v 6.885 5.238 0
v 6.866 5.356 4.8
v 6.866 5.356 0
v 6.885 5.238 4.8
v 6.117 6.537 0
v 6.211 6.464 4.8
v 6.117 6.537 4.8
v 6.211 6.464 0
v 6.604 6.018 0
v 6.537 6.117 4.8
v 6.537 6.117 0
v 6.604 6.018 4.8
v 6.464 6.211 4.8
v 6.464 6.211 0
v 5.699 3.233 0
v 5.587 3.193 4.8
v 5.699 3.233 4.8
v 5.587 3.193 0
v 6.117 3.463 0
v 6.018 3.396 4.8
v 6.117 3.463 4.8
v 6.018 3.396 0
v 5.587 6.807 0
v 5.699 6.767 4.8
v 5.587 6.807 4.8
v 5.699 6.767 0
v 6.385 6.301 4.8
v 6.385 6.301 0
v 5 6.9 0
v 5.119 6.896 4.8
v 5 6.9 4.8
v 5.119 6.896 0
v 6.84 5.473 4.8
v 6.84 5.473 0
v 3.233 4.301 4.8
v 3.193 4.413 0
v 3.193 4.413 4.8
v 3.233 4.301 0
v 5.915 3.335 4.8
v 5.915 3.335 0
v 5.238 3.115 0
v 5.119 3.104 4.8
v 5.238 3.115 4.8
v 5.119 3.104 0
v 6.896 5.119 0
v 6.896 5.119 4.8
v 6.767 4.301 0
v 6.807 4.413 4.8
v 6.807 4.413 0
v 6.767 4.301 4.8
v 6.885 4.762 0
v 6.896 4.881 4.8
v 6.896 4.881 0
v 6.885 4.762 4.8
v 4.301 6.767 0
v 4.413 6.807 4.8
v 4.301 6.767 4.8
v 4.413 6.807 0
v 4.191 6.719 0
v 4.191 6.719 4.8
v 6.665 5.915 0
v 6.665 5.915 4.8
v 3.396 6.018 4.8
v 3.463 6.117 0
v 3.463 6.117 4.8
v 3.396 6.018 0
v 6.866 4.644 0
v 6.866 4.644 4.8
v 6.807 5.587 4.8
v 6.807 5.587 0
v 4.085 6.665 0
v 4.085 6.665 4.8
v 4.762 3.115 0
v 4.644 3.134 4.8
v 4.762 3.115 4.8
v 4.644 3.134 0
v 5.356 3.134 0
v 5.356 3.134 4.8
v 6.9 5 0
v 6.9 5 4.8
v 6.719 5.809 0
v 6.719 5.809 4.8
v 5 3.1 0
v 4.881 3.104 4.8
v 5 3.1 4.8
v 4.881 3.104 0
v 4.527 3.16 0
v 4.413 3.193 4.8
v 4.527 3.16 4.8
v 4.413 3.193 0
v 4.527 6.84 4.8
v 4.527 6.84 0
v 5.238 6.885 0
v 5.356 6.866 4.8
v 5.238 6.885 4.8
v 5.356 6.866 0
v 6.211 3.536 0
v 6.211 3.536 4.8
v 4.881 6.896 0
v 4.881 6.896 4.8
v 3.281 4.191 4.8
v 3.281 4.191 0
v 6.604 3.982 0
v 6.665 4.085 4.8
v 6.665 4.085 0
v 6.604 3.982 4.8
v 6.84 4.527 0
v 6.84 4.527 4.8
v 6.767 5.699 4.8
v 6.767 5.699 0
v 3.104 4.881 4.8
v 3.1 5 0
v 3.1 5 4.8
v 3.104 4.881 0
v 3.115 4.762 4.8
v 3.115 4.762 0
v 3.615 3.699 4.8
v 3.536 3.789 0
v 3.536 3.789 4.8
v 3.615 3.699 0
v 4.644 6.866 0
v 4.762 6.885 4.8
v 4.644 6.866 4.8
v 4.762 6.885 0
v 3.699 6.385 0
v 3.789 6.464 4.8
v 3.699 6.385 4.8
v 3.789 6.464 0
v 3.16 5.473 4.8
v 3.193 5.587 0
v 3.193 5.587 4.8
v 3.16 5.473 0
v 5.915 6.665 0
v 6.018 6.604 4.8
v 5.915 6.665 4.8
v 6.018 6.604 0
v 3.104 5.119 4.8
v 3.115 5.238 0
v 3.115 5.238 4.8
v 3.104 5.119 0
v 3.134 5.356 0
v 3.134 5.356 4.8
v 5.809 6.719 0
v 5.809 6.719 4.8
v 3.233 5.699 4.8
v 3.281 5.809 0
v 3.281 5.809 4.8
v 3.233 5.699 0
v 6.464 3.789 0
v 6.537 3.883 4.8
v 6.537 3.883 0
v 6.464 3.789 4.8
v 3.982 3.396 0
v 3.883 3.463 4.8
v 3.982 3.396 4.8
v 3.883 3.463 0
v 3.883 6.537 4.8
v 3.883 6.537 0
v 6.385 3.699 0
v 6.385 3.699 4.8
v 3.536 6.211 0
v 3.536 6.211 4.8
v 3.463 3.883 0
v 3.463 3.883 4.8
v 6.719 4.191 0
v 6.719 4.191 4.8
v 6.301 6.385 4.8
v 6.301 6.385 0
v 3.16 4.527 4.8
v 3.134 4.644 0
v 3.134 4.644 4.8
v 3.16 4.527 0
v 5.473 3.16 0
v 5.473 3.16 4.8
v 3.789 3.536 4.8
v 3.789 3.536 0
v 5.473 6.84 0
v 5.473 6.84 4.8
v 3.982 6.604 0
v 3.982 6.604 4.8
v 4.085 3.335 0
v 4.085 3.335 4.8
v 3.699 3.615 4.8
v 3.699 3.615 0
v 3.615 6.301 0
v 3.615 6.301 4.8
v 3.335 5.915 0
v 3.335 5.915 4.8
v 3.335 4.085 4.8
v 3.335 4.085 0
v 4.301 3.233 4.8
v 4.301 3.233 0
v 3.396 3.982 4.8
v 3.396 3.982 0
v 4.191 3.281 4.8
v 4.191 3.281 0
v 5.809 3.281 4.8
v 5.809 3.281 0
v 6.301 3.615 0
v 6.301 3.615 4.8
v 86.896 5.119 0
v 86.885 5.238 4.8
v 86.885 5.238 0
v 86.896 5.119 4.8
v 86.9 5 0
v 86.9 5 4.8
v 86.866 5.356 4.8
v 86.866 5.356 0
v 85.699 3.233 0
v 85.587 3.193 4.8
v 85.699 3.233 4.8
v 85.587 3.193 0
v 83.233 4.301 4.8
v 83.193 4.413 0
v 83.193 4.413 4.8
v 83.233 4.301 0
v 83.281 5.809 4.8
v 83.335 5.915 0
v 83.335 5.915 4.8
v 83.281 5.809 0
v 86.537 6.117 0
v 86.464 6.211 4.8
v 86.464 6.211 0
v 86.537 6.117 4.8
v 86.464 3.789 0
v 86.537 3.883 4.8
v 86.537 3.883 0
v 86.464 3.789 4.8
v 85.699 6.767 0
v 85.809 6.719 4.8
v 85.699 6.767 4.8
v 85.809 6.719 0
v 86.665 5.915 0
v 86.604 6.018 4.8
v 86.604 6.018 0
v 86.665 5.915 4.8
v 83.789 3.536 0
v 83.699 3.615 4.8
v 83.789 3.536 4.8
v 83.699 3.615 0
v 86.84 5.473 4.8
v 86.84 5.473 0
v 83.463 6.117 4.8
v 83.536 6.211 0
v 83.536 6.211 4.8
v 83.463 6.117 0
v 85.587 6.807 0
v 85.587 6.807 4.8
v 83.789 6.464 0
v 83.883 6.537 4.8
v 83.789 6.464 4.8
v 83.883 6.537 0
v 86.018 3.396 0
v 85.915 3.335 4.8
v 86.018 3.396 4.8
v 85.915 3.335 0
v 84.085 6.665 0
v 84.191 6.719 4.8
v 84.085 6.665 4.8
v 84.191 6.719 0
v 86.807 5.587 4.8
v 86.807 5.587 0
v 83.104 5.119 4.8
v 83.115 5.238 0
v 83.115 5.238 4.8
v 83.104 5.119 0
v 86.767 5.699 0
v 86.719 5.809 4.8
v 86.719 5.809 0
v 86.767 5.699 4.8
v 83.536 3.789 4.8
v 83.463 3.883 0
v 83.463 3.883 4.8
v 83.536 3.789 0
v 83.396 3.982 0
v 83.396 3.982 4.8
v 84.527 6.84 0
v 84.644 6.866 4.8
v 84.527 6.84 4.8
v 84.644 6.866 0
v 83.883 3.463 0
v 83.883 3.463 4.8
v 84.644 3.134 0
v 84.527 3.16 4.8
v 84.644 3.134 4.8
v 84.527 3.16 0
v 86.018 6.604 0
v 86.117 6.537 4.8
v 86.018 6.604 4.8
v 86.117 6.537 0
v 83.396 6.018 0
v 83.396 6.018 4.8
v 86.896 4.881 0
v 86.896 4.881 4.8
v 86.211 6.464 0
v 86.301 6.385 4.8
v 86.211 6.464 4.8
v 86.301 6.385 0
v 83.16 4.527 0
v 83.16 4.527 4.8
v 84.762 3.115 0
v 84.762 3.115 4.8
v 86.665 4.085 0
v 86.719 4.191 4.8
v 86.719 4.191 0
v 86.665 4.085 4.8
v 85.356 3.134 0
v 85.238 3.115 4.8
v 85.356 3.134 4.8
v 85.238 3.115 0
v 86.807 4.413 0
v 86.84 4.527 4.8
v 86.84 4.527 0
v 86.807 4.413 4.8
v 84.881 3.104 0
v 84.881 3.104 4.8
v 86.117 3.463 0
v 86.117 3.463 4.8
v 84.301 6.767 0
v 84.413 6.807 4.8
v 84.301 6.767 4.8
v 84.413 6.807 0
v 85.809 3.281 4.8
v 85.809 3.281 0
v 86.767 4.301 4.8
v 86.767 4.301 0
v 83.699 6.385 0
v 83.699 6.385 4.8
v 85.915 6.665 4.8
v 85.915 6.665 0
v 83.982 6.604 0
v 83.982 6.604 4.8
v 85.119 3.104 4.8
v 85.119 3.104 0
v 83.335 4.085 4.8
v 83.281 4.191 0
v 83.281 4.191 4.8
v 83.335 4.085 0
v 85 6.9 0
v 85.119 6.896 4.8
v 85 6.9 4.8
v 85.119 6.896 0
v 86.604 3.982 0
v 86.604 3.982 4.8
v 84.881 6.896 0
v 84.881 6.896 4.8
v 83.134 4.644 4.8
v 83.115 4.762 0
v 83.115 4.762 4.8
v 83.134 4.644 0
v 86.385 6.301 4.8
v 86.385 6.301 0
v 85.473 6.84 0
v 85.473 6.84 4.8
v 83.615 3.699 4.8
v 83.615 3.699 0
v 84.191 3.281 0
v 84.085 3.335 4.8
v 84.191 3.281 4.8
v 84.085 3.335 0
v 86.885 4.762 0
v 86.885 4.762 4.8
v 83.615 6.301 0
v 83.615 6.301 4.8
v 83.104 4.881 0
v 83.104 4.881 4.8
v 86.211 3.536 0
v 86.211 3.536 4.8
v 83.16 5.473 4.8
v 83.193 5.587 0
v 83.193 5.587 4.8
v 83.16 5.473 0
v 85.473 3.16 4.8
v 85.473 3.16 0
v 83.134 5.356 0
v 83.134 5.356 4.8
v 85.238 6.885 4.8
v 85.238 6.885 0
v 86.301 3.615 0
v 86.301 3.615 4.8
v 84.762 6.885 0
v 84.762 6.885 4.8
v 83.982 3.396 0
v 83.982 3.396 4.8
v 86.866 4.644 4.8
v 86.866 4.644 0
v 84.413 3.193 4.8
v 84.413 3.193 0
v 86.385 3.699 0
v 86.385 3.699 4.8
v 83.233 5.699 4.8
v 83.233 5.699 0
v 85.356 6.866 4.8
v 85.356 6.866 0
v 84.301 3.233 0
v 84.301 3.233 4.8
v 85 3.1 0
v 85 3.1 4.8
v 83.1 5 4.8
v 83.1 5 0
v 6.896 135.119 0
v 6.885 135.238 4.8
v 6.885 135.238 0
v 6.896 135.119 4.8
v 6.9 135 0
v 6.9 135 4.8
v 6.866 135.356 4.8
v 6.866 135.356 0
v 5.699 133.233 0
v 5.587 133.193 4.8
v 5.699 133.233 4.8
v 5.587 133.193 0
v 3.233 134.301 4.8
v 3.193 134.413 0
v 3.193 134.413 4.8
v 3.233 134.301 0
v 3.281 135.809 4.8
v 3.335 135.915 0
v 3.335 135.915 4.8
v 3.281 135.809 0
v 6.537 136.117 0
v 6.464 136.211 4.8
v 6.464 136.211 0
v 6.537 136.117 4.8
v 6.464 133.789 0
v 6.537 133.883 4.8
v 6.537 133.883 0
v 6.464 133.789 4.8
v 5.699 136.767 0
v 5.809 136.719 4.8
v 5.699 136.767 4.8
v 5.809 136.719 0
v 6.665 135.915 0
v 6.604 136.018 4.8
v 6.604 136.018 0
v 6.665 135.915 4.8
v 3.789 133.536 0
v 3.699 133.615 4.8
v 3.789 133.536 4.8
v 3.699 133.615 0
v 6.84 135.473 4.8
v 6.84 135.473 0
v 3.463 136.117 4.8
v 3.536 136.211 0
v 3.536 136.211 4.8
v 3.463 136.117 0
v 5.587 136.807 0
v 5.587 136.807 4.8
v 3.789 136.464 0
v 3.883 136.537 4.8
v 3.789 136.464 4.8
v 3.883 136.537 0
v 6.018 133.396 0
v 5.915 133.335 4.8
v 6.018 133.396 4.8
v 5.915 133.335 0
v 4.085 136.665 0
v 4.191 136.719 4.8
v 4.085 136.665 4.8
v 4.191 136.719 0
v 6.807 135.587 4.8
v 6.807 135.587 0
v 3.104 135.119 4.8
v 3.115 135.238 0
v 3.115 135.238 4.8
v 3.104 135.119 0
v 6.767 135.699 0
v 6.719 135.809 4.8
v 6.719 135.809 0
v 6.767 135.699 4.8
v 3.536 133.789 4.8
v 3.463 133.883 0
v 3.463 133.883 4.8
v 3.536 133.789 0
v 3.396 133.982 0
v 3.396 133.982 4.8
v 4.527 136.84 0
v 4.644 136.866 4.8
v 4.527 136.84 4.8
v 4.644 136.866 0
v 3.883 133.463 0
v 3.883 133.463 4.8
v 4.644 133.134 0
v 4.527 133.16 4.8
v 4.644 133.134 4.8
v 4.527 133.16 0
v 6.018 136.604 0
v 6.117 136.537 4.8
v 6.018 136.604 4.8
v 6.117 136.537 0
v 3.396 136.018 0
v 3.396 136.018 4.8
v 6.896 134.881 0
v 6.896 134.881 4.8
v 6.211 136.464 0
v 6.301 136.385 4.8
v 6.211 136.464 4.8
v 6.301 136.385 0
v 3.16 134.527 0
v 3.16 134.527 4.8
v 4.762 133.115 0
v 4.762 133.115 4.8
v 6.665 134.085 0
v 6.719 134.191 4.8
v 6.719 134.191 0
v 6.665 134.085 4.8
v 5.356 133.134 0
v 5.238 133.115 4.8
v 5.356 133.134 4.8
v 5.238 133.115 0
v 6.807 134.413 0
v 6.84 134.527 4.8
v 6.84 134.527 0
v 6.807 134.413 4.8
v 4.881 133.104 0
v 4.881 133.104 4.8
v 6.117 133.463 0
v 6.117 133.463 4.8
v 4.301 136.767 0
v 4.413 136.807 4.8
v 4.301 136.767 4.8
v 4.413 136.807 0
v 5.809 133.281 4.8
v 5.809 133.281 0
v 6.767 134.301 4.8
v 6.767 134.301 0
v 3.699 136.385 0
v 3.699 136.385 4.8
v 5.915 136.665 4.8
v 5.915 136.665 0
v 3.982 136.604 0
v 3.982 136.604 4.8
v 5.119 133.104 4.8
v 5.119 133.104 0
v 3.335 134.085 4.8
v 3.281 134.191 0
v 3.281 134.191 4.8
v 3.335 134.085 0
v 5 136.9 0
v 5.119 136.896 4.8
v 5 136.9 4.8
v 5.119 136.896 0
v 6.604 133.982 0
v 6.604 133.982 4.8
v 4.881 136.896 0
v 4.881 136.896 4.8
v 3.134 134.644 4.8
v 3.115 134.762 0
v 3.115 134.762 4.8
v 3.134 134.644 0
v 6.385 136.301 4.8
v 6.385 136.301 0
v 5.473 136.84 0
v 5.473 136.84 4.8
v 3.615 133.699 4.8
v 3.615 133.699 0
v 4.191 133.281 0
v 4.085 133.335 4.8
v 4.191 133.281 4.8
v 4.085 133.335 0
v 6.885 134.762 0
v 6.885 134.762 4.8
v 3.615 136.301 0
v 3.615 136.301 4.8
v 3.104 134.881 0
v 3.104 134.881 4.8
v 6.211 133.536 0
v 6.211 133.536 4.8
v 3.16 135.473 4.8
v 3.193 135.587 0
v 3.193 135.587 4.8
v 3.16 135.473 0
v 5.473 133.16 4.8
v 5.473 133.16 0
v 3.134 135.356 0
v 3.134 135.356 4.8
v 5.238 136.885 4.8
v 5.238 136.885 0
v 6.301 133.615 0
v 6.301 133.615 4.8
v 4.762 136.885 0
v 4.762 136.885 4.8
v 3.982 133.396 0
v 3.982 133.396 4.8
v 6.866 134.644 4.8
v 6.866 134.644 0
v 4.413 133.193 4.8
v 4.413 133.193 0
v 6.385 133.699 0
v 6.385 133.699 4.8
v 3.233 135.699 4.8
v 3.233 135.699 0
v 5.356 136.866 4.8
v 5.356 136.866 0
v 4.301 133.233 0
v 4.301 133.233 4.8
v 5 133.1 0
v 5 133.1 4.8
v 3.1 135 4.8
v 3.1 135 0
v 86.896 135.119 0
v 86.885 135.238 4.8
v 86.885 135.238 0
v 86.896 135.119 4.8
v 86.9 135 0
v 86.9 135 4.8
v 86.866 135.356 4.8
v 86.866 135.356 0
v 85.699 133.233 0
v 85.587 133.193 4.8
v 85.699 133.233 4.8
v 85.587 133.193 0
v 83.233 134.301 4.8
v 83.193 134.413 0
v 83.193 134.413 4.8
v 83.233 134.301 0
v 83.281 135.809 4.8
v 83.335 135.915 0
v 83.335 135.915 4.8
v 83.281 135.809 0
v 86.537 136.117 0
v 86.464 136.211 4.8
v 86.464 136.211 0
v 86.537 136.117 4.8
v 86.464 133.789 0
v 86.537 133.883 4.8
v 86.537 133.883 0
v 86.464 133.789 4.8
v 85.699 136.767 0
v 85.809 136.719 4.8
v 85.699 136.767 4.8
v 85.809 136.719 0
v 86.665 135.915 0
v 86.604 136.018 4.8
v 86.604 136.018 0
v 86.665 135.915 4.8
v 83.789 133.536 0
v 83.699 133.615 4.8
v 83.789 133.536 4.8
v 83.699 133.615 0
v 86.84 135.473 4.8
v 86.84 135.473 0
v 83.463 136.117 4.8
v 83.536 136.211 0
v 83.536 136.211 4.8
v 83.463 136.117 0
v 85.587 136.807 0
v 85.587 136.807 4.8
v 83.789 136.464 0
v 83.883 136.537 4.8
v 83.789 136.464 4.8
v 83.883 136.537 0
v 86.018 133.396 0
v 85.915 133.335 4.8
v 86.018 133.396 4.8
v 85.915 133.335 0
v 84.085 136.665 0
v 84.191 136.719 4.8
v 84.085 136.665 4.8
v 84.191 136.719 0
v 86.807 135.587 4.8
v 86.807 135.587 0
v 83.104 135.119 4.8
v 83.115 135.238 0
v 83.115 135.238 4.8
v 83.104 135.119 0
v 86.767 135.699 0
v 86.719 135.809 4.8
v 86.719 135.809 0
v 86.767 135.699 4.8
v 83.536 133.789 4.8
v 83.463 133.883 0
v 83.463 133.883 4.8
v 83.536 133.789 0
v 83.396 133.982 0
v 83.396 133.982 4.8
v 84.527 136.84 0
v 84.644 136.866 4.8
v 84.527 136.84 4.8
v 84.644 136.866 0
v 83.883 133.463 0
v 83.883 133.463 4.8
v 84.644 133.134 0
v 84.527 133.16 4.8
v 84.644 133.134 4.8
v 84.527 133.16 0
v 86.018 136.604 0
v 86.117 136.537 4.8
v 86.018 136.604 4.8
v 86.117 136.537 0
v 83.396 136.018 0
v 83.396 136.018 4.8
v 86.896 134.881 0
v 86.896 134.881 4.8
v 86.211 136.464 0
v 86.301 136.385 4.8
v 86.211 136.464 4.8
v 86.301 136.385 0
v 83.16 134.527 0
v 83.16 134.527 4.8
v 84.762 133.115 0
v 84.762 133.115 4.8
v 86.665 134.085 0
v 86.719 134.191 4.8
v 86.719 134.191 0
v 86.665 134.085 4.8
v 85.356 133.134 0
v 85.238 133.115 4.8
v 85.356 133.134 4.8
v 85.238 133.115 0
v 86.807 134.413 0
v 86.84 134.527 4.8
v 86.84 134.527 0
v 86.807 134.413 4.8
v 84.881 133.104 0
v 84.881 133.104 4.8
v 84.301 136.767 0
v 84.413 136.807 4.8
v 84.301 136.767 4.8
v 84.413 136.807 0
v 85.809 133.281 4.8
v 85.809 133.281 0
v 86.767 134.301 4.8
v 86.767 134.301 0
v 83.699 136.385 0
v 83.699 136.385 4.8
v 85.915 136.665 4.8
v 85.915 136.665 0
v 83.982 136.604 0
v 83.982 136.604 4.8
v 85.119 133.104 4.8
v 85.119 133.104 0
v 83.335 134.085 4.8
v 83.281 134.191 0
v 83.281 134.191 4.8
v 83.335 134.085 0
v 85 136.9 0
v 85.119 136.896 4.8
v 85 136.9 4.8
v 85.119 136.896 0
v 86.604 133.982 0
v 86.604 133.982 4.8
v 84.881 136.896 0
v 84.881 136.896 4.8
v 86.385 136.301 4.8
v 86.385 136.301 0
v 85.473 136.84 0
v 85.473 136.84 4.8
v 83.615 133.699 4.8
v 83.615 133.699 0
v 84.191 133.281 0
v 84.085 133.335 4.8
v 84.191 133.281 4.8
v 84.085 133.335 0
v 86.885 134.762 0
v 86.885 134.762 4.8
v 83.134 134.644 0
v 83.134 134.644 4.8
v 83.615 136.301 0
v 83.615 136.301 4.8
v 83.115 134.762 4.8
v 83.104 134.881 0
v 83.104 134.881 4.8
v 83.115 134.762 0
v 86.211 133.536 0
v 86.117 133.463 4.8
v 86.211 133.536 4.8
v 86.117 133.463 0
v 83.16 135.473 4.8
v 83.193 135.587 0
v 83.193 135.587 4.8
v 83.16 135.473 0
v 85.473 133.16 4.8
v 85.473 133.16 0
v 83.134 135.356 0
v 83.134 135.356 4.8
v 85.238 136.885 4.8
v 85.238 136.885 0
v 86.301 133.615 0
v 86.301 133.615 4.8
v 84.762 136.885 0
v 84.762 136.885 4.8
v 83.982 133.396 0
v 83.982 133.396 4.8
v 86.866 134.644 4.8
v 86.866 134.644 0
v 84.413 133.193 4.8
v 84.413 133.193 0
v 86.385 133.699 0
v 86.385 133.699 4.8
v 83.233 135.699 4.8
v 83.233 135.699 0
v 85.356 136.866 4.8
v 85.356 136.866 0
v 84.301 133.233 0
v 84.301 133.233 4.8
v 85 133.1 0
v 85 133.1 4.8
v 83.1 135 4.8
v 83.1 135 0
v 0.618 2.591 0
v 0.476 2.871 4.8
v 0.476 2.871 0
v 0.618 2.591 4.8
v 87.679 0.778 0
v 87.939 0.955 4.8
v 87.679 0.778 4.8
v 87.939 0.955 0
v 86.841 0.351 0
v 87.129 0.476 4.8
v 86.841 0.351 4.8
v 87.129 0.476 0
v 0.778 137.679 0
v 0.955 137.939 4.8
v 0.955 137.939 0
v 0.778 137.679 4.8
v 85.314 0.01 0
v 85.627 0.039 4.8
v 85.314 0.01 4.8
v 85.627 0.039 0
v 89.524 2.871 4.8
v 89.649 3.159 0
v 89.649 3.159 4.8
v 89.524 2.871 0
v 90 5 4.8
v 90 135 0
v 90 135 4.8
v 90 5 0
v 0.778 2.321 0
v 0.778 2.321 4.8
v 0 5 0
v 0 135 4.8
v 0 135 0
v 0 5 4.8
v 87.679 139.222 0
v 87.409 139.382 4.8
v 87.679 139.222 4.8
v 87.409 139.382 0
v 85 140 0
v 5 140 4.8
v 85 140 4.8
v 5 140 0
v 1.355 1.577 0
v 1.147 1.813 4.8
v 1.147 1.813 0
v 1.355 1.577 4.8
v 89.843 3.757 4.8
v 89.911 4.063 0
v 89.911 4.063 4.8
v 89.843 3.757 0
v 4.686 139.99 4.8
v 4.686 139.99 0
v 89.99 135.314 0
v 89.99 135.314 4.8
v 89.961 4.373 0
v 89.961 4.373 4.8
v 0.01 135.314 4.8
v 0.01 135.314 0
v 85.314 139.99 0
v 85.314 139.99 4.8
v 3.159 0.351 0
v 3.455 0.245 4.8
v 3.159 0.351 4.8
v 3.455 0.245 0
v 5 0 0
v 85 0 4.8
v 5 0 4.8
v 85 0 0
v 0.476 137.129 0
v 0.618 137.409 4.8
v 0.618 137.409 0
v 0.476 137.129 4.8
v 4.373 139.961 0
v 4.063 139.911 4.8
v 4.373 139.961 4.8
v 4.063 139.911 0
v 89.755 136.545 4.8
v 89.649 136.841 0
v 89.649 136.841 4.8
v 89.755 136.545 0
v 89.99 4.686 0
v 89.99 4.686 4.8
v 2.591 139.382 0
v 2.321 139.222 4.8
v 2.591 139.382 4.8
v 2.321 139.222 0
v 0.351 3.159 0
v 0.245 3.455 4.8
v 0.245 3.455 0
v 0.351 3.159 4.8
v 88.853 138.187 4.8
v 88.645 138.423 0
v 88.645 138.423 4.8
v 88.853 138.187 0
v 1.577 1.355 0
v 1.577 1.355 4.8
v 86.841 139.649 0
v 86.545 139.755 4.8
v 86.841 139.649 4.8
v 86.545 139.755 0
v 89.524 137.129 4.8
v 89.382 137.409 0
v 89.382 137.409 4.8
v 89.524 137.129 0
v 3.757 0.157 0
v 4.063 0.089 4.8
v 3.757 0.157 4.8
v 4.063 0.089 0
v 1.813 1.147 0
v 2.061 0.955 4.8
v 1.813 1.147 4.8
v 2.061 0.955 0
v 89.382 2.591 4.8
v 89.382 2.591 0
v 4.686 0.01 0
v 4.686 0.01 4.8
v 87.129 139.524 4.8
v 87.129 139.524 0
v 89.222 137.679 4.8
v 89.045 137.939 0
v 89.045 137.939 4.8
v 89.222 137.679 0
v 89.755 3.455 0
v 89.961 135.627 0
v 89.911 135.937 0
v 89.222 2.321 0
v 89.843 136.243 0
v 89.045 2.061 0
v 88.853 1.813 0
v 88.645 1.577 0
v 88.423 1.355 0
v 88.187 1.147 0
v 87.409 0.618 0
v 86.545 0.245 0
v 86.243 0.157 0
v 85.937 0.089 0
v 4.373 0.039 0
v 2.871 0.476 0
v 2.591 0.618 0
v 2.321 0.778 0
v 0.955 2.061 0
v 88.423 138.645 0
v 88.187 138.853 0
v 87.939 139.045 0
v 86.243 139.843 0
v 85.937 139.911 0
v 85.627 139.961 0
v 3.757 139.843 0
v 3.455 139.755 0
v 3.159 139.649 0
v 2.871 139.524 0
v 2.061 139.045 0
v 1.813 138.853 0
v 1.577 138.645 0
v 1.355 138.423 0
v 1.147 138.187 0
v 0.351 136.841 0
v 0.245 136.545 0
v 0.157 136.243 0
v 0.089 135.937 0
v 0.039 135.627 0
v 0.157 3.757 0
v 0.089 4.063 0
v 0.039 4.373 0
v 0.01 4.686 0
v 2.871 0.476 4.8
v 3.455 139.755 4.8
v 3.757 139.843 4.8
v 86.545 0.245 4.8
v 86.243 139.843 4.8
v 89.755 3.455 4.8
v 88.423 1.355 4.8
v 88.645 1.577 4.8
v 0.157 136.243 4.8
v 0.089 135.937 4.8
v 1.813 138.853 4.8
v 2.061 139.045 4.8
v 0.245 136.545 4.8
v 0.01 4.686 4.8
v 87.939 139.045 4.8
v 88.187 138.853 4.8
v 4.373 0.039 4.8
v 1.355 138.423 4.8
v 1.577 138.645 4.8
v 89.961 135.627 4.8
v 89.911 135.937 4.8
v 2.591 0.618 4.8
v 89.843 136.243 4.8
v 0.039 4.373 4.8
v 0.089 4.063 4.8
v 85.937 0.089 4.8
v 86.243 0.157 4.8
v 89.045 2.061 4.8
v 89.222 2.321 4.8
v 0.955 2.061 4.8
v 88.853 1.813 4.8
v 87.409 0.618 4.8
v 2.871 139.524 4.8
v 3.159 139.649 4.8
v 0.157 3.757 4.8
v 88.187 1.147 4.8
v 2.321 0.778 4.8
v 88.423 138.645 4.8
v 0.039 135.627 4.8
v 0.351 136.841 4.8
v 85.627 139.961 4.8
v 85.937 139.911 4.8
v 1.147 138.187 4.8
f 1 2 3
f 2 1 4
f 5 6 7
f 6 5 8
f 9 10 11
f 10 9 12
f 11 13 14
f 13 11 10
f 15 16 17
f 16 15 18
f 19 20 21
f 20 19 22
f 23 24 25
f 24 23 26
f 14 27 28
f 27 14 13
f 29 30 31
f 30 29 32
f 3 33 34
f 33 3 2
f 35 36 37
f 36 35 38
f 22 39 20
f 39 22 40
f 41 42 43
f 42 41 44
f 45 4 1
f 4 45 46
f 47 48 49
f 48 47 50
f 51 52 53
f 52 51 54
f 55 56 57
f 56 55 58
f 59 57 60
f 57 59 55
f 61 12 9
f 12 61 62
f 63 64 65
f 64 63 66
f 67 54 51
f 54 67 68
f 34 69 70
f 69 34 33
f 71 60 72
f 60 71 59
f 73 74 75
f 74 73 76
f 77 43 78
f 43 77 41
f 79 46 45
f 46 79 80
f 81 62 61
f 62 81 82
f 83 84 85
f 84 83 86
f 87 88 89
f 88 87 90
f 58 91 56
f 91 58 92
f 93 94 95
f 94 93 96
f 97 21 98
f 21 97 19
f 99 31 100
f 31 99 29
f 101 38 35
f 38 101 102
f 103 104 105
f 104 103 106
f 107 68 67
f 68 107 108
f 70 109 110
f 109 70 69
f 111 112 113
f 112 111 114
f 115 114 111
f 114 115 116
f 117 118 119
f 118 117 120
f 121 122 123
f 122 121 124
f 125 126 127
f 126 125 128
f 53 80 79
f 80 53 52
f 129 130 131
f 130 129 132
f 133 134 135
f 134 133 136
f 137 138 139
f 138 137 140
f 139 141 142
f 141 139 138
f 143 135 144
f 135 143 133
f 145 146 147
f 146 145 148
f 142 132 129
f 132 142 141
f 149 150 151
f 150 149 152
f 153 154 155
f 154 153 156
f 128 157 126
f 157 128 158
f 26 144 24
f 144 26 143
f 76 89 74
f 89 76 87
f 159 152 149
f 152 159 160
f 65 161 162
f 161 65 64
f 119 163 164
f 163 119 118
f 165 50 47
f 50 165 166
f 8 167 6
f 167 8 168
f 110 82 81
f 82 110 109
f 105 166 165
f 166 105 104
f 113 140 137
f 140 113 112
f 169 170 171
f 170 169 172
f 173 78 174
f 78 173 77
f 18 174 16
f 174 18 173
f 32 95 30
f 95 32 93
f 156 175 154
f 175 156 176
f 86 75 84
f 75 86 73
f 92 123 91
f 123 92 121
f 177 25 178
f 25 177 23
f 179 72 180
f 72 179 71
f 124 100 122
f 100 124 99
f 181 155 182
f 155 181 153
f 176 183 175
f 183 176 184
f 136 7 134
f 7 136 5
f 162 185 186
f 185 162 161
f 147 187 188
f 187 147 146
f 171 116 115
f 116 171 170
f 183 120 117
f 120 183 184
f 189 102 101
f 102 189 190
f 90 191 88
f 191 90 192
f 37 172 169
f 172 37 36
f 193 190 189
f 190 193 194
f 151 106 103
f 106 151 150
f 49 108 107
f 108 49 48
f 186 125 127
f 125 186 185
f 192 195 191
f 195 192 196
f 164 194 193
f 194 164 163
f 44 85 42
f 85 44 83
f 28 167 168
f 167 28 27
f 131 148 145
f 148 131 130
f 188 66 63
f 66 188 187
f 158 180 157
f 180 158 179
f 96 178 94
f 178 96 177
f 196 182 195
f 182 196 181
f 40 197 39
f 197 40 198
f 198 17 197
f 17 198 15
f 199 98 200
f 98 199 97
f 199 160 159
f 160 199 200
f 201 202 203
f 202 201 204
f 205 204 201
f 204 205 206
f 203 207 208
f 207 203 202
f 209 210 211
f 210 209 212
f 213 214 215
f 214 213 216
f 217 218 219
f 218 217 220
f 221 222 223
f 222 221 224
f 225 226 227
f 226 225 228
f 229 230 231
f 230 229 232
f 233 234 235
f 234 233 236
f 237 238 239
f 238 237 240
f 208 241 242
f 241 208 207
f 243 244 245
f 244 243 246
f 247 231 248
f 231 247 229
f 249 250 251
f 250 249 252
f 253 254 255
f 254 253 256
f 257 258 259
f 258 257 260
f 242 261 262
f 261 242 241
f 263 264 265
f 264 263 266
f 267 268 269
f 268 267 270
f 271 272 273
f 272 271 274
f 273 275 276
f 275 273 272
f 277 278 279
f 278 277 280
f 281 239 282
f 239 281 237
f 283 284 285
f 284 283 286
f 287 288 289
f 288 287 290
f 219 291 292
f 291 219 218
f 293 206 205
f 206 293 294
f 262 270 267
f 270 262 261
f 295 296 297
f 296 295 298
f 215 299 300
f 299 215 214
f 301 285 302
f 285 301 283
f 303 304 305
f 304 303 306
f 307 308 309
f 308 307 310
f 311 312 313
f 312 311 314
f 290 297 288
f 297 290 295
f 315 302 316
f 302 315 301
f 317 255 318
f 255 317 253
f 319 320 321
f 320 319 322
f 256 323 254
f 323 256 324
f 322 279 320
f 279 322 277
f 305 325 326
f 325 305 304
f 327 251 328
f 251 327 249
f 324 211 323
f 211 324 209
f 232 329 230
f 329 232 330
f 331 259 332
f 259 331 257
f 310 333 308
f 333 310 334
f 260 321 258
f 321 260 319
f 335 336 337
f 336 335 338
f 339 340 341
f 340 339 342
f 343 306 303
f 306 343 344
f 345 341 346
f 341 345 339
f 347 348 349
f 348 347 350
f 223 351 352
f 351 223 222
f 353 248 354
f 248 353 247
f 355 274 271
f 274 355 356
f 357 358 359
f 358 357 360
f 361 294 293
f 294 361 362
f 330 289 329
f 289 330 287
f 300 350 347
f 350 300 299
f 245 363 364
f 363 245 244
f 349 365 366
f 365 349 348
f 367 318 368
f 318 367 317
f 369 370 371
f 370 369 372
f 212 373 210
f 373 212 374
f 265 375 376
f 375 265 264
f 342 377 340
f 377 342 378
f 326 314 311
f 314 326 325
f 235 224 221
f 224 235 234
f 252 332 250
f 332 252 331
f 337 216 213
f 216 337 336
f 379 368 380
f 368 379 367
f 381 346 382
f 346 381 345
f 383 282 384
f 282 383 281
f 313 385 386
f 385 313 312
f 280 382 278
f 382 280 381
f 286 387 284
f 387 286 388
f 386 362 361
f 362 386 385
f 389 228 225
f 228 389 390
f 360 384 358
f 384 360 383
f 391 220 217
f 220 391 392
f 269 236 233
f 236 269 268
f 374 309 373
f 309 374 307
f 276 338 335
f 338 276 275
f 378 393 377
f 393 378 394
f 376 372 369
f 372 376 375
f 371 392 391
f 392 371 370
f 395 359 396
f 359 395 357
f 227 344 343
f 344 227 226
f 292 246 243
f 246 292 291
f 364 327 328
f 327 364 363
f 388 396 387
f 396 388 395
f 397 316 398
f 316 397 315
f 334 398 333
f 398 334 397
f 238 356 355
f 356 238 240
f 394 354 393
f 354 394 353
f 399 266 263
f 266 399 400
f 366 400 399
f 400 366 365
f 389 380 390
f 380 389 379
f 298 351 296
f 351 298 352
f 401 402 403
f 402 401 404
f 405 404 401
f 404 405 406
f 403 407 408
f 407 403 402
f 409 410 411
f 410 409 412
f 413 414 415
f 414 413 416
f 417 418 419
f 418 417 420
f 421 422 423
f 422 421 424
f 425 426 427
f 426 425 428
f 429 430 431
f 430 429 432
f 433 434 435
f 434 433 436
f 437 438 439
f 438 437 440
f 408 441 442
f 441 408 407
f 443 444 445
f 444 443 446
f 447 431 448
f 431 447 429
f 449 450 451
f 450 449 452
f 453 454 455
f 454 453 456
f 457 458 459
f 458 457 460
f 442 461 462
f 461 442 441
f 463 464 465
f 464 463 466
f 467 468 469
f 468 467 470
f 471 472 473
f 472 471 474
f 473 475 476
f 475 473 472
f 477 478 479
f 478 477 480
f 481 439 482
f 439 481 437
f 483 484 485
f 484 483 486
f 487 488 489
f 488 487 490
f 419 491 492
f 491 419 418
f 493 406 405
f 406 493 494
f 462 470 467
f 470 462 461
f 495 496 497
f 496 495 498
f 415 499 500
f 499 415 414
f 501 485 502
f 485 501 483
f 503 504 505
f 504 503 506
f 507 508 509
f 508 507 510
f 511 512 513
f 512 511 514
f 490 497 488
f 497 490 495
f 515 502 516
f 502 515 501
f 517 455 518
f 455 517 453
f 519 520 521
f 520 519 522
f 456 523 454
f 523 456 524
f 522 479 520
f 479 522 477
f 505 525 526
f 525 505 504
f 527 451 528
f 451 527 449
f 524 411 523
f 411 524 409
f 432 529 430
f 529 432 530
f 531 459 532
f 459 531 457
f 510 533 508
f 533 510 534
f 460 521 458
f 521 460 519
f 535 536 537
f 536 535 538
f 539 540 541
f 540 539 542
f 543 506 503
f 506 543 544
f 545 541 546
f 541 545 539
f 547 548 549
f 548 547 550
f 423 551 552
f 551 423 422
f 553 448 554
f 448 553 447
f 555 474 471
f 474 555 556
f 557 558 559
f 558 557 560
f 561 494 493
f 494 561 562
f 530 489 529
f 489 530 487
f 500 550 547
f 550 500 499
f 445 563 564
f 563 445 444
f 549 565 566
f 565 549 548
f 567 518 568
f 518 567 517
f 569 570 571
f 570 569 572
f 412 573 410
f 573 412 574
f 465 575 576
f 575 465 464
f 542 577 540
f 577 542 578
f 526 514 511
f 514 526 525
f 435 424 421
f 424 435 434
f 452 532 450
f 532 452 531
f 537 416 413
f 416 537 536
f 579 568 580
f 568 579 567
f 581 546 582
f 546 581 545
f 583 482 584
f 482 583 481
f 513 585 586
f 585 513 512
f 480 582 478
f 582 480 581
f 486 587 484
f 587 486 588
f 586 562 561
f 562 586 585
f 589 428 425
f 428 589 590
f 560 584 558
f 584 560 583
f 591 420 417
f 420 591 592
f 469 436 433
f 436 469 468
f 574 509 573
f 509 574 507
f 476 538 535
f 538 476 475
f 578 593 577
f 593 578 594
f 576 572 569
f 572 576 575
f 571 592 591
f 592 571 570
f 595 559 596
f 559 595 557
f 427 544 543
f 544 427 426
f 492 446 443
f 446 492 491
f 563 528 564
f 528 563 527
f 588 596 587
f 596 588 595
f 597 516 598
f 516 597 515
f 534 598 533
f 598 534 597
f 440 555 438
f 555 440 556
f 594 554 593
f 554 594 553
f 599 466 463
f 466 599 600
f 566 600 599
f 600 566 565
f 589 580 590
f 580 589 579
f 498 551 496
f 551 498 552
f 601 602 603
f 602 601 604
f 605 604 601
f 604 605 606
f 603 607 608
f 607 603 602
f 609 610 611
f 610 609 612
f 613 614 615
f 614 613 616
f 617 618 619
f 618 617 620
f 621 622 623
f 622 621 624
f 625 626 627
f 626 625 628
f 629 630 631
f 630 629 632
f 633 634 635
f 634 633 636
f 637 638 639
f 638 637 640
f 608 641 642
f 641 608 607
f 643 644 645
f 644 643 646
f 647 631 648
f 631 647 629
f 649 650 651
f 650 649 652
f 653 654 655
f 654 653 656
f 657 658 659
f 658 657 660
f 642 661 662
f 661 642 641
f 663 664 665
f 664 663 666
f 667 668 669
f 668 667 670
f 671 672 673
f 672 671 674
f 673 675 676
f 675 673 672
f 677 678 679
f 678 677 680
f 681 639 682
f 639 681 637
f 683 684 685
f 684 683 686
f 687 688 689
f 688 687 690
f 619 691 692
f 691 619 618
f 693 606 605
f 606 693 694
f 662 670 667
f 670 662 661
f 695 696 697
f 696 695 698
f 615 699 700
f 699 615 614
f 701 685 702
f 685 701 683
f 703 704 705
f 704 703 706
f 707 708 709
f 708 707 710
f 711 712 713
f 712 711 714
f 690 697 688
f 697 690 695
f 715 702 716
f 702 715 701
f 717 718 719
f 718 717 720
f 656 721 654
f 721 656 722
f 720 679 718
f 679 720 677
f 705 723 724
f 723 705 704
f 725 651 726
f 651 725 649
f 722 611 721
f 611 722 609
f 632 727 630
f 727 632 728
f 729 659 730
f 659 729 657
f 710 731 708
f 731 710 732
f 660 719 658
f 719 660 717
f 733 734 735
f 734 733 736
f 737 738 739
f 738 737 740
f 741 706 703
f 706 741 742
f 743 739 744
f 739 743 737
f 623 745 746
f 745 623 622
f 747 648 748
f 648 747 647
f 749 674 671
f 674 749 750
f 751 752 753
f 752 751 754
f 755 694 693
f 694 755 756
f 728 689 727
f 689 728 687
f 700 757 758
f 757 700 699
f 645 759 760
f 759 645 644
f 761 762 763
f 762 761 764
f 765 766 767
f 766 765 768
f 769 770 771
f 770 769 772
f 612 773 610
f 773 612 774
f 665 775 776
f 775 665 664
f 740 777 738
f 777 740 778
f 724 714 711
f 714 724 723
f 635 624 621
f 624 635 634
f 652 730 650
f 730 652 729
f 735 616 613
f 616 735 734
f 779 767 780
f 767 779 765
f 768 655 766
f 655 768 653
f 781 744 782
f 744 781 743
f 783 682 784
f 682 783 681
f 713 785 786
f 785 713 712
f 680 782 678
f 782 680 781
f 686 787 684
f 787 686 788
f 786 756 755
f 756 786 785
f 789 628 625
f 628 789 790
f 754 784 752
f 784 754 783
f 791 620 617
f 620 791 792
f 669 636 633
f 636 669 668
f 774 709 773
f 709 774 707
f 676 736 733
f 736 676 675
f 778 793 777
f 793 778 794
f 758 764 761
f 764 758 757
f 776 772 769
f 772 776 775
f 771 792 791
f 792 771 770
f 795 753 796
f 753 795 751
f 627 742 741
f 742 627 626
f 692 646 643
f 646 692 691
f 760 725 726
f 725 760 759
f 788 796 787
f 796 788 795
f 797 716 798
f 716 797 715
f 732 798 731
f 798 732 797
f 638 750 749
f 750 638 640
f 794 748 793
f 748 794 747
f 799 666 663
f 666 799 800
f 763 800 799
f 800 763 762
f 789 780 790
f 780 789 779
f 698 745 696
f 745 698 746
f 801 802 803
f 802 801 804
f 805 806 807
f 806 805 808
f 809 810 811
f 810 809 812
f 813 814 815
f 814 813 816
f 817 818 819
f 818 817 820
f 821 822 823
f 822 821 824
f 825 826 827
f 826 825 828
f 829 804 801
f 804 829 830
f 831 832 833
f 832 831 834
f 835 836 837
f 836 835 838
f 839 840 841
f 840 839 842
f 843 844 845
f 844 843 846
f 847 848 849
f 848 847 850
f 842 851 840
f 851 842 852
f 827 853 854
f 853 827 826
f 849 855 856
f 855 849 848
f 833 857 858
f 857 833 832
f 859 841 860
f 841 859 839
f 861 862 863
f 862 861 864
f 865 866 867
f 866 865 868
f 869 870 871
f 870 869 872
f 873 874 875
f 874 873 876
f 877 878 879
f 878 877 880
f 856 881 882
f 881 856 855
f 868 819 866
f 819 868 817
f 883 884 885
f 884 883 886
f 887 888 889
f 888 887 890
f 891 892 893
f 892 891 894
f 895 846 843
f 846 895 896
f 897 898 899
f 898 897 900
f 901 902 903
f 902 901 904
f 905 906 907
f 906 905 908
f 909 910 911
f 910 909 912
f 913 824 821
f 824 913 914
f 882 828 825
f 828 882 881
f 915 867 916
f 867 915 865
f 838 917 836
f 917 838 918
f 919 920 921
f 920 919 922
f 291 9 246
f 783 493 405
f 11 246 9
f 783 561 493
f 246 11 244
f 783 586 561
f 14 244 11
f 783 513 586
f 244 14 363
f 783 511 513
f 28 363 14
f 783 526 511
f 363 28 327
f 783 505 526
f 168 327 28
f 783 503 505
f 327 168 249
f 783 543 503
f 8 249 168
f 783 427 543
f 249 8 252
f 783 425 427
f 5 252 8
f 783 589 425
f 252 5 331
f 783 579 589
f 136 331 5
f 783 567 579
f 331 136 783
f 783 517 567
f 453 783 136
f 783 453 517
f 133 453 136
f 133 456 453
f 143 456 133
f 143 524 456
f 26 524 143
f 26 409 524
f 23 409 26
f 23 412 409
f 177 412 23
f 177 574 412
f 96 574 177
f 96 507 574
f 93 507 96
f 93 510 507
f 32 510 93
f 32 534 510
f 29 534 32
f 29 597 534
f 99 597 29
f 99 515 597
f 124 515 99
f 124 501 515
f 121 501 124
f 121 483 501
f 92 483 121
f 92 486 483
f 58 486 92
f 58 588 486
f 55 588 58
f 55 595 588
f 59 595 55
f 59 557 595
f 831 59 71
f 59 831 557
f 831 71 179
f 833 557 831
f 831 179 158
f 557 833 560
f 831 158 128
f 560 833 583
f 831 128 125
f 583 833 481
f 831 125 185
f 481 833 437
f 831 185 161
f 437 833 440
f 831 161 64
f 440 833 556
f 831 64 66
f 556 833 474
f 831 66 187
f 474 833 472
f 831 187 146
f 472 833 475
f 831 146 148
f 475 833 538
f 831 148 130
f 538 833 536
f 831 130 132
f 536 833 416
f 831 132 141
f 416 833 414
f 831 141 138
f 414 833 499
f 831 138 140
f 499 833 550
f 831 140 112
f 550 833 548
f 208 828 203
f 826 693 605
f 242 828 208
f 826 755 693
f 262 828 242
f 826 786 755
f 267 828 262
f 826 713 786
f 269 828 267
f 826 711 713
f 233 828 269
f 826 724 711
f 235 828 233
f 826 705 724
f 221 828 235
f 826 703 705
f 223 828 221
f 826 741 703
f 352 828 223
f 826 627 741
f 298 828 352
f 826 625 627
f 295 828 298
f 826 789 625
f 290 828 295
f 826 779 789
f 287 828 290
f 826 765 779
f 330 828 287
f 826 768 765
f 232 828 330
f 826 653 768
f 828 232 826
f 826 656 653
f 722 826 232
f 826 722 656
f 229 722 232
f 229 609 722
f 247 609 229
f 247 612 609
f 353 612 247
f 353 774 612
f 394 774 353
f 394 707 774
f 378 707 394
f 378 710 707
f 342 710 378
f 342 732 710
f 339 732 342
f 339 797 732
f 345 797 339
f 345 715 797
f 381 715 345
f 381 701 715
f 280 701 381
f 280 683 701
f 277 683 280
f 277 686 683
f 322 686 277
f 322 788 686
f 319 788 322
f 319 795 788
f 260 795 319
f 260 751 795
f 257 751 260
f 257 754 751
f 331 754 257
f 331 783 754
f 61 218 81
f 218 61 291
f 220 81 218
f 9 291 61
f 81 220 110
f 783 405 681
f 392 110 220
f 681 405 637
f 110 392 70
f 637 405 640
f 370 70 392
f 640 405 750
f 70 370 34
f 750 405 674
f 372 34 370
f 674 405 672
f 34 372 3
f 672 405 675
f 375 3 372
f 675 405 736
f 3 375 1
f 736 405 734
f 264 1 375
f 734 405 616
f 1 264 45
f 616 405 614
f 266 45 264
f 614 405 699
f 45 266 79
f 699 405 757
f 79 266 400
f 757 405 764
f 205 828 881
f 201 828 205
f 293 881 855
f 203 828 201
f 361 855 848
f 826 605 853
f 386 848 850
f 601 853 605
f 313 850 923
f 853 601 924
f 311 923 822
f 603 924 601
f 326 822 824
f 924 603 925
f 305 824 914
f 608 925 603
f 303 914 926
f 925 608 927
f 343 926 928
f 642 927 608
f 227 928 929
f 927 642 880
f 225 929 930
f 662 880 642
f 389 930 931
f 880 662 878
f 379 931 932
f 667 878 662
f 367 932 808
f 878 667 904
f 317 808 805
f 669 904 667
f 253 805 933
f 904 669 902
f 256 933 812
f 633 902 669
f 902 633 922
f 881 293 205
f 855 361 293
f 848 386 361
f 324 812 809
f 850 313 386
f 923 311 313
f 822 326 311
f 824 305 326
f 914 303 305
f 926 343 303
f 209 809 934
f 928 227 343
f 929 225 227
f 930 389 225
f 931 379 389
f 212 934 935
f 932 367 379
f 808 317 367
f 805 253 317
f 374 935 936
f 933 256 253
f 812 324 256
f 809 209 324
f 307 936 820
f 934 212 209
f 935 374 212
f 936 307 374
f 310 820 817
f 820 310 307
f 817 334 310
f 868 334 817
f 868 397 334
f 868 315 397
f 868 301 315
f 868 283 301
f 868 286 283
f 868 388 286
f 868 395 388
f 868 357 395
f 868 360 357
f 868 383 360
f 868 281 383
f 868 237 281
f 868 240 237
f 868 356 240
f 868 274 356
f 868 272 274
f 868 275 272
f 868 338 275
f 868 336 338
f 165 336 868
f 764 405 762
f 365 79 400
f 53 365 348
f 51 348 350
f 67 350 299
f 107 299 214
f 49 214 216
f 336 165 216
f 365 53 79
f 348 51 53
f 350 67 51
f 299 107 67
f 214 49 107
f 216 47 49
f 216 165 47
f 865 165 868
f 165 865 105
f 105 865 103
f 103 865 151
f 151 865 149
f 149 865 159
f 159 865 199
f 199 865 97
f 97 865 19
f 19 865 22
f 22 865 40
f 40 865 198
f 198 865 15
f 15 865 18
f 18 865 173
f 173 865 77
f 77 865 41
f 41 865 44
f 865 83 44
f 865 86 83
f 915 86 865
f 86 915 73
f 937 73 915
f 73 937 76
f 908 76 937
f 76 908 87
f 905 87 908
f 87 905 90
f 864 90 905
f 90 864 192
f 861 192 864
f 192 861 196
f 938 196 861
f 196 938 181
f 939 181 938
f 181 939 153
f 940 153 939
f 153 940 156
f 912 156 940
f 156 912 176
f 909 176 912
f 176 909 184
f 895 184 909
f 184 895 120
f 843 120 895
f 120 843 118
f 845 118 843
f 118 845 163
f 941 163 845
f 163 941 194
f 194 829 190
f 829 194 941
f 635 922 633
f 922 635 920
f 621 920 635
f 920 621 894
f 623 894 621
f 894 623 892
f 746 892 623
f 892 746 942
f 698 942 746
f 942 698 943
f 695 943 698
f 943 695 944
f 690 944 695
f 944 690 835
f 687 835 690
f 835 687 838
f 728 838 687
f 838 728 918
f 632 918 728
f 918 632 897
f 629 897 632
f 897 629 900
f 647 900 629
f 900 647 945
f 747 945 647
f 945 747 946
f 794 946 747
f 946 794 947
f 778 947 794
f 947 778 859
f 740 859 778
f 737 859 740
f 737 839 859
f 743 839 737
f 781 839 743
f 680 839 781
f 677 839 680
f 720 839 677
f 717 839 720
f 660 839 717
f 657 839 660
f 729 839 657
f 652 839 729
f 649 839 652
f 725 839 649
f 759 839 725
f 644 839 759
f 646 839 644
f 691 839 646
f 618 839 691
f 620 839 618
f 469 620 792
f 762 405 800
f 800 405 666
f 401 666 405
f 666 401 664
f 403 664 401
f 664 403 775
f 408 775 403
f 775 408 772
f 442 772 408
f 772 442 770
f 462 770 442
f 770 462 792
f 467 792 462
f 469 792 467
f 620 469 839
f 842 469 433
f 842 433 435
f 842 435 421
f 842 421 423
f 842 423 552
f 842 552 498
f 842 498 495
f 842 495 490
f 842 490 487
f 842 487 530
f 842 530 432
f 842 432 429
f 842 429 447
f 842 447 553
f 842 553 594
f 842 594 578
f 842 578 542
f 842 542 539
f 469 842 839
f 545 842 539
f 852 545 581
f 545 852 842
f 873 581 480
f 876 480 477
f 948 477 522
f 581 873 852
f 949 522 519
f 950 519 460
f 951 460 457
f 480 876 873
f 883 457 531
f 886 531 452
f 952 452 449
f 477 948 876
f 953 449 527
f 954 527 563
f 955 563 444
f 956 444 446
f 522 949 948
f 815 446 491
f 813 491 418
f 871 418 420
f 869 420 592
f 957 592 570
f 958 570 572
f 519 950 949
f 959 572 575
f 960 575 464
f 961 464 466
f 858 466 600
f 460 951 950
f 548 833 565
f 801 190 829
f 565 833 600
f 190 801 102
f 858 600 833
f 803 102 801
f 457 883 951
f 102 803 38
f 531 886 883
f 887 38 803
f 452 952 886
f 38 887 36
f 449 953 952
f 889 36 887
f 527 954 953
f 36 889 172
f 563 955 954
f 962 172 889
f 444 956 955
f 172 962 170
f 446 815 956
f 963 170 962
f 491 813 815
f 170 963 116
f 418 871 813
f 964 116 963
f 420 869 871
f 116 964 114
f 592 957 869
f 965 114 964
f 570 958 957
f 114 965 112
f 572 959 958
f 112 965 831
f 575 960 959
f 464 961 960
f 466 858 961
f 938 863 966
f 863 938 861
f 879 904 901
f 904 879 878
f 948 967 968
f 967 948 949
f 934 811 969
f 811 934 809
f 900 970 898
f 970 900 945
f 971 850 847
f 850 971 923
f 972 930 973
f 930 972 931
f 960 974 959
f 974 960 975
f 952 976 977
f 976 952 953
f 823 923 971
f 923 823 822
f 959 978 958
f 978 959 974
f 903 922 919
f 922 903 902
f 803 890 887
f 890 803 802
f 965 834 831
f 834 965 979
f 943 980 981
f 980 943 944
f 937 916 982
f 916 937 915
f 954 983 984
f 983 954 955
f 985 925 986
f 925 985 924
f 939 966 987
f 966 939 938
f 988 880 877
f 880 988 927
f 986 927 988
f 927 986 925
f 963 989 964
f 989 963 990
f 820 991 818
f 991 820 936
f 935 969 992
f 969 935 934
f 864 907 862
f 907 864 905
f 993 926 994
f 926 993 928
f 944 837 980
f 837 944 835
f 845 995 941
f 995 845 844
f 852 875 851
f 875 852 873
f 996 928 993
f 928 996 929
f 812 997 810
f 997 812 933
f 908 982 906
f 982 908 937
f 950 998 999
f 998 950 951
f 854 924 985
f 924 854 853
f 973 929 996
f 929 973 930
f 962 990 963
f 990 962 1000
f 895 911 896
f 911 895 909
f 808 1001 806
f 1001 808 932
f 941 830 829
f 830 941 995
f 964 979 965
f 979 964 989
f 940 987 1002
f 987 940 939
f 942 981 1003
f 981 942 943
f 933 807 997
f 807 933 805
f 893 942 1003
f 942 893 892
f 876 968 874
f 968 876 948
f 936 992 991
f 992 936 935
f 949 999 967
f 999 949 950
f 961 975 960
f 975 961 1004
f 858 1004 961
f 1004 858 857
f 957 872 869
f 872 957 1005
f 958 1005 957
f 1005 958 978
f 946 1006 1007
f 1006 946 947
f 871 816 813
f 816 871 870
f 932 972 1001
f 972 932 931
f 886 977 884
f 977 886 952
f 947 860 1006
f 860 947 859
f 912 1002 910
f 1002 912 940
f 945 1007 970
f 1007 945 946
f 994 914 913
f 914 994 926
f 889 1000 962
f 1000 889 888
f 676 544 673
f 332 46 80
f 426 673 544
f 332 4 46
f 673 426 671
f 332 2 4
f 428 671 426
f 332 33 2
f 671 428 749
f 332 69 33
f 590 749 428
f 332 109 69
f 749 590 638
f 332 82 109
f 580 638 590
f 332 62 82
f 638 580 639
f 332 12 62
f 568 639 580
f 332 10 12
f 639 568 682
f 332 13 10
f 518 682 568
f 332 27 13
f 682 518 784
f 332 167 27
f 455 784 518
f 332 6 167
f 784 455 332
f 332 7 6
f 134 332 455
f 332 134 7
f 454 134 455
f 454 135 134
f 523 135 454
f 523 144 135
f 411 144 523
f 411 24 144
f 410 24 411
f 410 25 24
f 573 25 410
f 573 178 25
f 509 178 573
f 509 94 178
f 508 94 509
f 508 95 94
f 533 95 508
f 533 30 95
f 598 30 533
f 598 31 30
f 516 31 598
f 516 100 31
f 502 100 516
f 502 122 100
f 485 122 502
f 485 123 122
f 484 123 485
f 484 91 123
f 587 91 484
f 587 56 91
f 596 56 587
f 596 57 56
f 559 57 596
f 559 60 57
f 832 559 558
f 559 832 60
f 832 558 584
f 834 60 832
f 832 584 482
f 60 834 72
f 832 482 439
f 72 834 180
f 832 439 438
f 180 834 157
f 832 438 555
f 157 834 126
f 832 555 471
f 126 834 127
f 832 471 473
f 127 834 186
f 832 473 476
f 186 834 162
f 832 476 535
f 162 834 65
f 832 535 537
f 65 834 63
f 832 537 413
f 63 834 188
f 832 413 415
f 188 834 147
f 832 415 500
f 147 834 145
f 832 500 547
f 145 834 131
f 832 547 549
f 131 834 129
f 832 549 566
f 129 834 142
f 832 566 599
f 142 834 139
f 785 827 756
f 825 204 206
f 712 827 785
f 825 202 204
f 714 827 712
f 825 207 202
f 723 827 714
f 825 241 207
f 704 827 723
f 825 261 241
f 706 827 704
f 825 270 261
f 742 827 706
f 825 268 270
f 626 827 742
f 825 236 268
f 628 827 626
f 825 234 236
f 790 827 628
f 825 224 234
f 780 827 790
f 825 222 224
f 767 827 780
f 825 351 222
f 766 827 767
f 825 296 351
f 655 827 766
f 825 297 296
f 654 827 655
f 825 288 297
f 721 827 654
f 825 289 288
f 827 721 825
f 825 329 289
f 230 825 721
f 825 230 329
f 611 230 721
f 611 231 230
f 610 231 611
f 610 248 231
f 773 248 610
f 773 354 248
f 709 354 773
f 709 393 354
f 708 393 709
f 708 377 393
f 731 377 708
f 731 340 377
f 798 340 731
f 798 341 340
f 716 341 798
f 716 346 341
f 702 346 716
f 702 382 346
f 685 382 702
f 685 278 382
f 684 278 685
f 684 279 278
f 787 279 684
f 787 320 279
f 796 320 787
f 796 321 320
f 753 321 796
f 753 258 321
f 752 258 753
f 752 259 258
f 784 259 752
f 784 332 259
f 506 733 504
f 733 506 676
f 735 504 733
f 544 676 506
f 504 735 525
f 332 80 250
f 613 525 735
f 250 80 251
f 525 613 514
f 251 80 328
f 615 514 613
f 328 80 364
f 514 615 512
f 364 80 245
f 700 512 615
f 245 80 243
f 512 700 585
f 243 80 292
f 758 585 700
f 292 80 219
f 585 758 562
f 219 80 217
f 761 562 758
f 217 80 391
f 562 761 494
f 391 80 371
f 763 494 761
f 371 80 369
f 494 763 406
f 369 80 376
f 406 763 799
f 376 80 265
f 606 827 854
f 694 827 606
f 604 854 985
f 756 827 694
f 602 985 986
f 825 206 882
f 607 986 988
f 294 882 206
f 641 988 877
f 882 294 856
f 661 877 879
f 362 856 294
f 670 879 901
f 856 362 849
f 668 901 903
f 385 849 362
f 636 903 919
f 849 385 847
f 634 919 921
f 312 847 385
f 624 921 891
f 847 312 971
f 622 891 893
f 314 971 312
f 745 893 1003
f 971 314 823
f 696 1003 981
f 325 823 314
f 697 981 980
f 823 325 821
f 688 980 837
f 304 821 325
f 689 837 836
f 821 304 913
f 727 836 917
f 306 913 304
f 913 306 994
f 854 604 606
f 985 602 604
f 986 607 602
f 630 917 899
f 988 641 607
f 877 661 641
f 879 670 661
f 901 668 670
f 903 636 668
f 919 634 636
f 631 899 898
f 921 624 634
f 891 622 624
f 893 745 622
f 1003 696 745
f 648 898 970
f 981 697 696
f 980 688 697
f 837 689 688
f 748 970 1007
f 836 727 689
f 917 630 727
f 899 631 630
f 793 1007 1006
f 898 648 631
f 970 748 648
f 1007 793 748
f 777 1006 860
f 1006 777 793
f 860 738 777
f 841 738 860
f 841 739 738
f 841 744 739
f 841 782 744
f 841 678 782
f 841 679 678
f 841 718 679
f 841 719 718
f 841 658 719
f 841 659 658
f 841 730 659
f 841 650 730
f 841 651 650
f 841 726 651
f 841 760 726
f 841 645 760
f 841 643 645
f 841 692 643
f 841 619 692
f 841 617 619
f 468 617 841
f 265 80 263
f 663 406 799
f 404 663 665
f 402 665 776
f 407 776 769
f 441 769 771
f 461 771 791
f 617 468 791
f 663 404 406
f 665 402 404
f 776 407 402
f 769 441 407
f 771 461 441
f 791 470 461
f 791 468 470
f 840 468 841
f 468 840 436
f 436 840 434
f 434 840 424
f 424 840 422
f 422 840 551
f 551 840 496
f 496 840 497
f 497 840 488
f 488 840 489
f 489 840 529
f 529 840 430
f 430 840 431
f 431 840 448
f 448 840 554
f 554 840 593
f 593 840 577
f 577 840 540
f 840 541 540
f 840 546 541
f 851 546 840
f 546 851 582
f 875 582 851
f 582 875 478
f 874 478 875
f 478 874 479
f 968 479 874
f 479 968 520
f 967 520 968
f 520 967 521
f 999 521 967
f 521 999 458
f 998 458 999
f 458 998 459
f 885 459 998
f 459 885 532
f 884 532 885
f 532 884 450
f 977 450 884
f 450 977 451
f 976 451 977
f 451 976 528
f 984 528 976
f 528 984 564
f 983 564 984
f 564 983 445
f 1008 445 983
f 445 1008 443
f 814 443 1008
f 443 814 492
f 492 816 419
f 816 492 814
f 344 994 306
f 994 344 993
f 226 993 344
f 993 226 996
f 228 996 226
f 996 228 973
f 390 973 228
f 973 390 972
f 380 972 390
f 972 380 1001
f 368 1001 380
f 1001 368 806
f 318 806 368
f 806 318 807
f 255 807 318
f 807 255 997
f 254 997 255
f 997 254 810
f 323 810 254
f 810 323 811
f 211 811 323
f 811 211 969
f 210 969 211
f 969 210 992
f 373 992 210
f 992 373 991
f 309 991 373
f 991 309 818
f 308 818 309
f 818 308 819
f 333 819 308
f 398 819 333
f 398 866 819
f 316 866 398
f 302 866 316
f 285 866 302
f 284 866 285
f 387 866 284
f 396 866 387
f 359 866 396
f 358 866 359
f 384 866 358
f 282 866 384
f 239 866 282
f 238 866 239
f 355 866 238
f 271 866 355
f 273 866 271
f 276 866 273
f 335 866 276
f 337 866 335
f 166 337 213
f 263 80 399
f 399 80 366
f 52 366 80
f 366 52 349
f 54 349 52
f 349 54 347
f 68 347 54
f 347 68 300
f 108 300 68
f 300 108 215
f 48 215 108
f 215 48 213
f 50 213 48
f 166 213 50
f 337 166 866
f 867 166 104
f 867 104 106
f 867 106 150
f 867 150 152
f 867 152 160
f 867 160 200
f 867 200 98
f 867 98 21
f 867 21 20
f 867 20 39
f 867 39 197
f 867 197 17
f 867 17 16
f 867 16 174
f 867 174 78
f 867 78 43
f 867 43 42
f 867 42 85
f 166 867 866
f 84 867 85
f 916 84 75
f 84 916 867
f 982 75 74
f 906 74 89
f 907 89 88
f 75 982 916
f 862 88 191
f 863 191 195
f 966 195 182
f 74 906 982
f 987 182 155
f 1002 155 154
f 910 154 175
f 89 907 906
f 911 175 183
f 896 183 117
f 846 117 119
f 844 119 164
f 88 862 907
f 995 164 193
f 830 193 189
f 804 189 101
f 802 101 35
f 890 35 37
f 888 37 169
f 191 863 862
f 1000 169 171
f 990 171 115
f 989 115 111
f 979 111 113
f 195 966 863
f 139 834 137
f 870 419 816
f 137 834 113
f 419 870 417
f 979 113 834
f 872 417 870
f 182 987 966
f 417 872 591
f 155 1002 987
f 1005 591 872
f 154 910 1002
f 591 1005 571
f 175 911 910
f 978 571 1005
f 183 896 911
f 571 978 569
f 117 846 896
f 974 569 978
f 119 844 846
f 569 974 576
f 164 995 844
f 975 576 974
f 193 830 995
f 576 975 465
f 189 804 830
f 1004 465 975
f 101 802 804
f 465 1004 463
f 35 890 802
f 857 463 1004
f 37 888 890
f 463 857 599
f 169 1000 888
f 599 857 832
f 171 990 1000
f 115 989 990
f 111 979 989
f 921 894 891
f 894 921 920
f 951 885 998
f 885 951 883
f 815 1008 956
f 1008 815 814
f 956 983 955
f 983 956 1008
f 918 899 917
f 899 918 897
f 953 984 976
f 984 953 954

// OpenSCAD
// file: ../configurations/global.scad
housing_facades_throws_diameter = 3.8;

// external size
case_external_x_size = 90;
case_external_y_size = 140;
case_external_z_size = 38;
case_external_panes_thickness = 4.8;

facade_front_round_edges_radius = 5;
facade_throws_margin = 5;

// facade corners
facade_corners_offset_lenght = 9;
facade_corners_main_x_size = 19;
facade_corners_main_y_size = 19;
facade_corners_main_thickness = 11;
facade_corners_correction_offset_length = 0.2;
facade_corners_correction_offset_thickness = 0.0;
facade_fn = 100;


// Generics
insert_throw_diameter = 4.2;
insert_throw_length = 6 + 2;
// file: ../libraries/electronics.scad
/**
 * getPointSize
 * @returns Point size (mil)
 */
function getPointSize() = 2.54;


/**
 * getSizeFromPointCount
 * @returns dimension in milimeters from points numbers
 */
function getSizeFromPointCount(point_count) = (point_count + 1) * getPointSize();
// file: ../libraries/commons.scad
/**
 * forEachCoord
 * Wrapper to apply child on each element
 */
module forEachCoord(coords_list) {
    for (coords = coords_list)
        translate(
            [
                coords[0] == undef ? 0 : coords[0],
                coords[1] == undef ? 0 : coords[1],
                coords[2] == undef ? 0 : coords[2],
            ]
        )
            children();
}
// file: subpieces/rounded-pane.scad
/**
 * roundedPane
 * @name roundedPane
 * @description roundedPane
 * @type Supbiece
 * @parent 
 */
module roundedPane(
    x_y_z_coords,
    r1,
    r2,
    center = false,
    $fn = $fn
) {
    x = x_y_z_coords[0];
    y = x_y_z_coords[1];
    z = x_y_z_coords[2];

    r = (r1 < r2) ? r2 : r1;

    module _pane() {
        hull() {
            translate([r,r,0]) {
                cylinder(z, r1 = r1, r2 = r2);
            }

            translate([x-r,r,0]) {
                cylinder(z, r1 = r1, r2 = r2);
            }

            translate([r,y-r,0]) {
                cylinder(z, r1 = r1, r2 = r2);
            }

            translate([x-r,y-r,0]) {
                cylinder(z, r1 = r1, r2 = r2);
            }
        }
    }

    if (center) {
        translate([-x / 2, -y / 2, -z / 2])
            _pane();
    } else {
        _pane();
    }

}
// main file
use <./subpieces/rounded-pane.scad>

use <./../libraries/commons.scad>
use <./../libraries/electronics.scad>

include <./../configurations/global.scad>


/**
 * facadeFrontPiece
 * @name facadeFrontPiece
 * @description Piece can be printed or CNC cutted #3DPrint, #CNC
 * @type piece
 * @parent housingComponent
 * @stl
 */
module facadeFrontPiece(
    x_size = case_external_x_size,
    y_size = case_external_y_size,
    z_size = case_external_panes_thickness,
    throws_margin = facade_throws_margin,
    round_edges_radius = facade_front_round_edges_radius,
    throws_diameter = housing_facades_throws_diameter,
    $fn = facade_fn
) {
    echo(str("facadeFrontPiece ", "x_size: ", x_size, " y_size: ", y_size, " z_size: ", z_size));

    difference() {
        color("BurlyWood")
            roundedPane(
                [x_size, y_size, z_size],
                r1 = round_edges_radius,
                r2 = round_edges_radius,
                center = false,
                $fn = $fn
            );

        translate([0, 0, -z_size / 2])
            forEachCoord([
                [throws_margin, throws_margin],
                [x_size - throws_margin, throws_margin],
                [throws_margin, y_size - throws_margin],
                [x_size - throws_margin, y_size - throws_margin,],
            ])
                cylinder(h = z_size * 2, d = throws_diameter, $fn = $fn);

    

    }
}

facadeFrontPiece();
